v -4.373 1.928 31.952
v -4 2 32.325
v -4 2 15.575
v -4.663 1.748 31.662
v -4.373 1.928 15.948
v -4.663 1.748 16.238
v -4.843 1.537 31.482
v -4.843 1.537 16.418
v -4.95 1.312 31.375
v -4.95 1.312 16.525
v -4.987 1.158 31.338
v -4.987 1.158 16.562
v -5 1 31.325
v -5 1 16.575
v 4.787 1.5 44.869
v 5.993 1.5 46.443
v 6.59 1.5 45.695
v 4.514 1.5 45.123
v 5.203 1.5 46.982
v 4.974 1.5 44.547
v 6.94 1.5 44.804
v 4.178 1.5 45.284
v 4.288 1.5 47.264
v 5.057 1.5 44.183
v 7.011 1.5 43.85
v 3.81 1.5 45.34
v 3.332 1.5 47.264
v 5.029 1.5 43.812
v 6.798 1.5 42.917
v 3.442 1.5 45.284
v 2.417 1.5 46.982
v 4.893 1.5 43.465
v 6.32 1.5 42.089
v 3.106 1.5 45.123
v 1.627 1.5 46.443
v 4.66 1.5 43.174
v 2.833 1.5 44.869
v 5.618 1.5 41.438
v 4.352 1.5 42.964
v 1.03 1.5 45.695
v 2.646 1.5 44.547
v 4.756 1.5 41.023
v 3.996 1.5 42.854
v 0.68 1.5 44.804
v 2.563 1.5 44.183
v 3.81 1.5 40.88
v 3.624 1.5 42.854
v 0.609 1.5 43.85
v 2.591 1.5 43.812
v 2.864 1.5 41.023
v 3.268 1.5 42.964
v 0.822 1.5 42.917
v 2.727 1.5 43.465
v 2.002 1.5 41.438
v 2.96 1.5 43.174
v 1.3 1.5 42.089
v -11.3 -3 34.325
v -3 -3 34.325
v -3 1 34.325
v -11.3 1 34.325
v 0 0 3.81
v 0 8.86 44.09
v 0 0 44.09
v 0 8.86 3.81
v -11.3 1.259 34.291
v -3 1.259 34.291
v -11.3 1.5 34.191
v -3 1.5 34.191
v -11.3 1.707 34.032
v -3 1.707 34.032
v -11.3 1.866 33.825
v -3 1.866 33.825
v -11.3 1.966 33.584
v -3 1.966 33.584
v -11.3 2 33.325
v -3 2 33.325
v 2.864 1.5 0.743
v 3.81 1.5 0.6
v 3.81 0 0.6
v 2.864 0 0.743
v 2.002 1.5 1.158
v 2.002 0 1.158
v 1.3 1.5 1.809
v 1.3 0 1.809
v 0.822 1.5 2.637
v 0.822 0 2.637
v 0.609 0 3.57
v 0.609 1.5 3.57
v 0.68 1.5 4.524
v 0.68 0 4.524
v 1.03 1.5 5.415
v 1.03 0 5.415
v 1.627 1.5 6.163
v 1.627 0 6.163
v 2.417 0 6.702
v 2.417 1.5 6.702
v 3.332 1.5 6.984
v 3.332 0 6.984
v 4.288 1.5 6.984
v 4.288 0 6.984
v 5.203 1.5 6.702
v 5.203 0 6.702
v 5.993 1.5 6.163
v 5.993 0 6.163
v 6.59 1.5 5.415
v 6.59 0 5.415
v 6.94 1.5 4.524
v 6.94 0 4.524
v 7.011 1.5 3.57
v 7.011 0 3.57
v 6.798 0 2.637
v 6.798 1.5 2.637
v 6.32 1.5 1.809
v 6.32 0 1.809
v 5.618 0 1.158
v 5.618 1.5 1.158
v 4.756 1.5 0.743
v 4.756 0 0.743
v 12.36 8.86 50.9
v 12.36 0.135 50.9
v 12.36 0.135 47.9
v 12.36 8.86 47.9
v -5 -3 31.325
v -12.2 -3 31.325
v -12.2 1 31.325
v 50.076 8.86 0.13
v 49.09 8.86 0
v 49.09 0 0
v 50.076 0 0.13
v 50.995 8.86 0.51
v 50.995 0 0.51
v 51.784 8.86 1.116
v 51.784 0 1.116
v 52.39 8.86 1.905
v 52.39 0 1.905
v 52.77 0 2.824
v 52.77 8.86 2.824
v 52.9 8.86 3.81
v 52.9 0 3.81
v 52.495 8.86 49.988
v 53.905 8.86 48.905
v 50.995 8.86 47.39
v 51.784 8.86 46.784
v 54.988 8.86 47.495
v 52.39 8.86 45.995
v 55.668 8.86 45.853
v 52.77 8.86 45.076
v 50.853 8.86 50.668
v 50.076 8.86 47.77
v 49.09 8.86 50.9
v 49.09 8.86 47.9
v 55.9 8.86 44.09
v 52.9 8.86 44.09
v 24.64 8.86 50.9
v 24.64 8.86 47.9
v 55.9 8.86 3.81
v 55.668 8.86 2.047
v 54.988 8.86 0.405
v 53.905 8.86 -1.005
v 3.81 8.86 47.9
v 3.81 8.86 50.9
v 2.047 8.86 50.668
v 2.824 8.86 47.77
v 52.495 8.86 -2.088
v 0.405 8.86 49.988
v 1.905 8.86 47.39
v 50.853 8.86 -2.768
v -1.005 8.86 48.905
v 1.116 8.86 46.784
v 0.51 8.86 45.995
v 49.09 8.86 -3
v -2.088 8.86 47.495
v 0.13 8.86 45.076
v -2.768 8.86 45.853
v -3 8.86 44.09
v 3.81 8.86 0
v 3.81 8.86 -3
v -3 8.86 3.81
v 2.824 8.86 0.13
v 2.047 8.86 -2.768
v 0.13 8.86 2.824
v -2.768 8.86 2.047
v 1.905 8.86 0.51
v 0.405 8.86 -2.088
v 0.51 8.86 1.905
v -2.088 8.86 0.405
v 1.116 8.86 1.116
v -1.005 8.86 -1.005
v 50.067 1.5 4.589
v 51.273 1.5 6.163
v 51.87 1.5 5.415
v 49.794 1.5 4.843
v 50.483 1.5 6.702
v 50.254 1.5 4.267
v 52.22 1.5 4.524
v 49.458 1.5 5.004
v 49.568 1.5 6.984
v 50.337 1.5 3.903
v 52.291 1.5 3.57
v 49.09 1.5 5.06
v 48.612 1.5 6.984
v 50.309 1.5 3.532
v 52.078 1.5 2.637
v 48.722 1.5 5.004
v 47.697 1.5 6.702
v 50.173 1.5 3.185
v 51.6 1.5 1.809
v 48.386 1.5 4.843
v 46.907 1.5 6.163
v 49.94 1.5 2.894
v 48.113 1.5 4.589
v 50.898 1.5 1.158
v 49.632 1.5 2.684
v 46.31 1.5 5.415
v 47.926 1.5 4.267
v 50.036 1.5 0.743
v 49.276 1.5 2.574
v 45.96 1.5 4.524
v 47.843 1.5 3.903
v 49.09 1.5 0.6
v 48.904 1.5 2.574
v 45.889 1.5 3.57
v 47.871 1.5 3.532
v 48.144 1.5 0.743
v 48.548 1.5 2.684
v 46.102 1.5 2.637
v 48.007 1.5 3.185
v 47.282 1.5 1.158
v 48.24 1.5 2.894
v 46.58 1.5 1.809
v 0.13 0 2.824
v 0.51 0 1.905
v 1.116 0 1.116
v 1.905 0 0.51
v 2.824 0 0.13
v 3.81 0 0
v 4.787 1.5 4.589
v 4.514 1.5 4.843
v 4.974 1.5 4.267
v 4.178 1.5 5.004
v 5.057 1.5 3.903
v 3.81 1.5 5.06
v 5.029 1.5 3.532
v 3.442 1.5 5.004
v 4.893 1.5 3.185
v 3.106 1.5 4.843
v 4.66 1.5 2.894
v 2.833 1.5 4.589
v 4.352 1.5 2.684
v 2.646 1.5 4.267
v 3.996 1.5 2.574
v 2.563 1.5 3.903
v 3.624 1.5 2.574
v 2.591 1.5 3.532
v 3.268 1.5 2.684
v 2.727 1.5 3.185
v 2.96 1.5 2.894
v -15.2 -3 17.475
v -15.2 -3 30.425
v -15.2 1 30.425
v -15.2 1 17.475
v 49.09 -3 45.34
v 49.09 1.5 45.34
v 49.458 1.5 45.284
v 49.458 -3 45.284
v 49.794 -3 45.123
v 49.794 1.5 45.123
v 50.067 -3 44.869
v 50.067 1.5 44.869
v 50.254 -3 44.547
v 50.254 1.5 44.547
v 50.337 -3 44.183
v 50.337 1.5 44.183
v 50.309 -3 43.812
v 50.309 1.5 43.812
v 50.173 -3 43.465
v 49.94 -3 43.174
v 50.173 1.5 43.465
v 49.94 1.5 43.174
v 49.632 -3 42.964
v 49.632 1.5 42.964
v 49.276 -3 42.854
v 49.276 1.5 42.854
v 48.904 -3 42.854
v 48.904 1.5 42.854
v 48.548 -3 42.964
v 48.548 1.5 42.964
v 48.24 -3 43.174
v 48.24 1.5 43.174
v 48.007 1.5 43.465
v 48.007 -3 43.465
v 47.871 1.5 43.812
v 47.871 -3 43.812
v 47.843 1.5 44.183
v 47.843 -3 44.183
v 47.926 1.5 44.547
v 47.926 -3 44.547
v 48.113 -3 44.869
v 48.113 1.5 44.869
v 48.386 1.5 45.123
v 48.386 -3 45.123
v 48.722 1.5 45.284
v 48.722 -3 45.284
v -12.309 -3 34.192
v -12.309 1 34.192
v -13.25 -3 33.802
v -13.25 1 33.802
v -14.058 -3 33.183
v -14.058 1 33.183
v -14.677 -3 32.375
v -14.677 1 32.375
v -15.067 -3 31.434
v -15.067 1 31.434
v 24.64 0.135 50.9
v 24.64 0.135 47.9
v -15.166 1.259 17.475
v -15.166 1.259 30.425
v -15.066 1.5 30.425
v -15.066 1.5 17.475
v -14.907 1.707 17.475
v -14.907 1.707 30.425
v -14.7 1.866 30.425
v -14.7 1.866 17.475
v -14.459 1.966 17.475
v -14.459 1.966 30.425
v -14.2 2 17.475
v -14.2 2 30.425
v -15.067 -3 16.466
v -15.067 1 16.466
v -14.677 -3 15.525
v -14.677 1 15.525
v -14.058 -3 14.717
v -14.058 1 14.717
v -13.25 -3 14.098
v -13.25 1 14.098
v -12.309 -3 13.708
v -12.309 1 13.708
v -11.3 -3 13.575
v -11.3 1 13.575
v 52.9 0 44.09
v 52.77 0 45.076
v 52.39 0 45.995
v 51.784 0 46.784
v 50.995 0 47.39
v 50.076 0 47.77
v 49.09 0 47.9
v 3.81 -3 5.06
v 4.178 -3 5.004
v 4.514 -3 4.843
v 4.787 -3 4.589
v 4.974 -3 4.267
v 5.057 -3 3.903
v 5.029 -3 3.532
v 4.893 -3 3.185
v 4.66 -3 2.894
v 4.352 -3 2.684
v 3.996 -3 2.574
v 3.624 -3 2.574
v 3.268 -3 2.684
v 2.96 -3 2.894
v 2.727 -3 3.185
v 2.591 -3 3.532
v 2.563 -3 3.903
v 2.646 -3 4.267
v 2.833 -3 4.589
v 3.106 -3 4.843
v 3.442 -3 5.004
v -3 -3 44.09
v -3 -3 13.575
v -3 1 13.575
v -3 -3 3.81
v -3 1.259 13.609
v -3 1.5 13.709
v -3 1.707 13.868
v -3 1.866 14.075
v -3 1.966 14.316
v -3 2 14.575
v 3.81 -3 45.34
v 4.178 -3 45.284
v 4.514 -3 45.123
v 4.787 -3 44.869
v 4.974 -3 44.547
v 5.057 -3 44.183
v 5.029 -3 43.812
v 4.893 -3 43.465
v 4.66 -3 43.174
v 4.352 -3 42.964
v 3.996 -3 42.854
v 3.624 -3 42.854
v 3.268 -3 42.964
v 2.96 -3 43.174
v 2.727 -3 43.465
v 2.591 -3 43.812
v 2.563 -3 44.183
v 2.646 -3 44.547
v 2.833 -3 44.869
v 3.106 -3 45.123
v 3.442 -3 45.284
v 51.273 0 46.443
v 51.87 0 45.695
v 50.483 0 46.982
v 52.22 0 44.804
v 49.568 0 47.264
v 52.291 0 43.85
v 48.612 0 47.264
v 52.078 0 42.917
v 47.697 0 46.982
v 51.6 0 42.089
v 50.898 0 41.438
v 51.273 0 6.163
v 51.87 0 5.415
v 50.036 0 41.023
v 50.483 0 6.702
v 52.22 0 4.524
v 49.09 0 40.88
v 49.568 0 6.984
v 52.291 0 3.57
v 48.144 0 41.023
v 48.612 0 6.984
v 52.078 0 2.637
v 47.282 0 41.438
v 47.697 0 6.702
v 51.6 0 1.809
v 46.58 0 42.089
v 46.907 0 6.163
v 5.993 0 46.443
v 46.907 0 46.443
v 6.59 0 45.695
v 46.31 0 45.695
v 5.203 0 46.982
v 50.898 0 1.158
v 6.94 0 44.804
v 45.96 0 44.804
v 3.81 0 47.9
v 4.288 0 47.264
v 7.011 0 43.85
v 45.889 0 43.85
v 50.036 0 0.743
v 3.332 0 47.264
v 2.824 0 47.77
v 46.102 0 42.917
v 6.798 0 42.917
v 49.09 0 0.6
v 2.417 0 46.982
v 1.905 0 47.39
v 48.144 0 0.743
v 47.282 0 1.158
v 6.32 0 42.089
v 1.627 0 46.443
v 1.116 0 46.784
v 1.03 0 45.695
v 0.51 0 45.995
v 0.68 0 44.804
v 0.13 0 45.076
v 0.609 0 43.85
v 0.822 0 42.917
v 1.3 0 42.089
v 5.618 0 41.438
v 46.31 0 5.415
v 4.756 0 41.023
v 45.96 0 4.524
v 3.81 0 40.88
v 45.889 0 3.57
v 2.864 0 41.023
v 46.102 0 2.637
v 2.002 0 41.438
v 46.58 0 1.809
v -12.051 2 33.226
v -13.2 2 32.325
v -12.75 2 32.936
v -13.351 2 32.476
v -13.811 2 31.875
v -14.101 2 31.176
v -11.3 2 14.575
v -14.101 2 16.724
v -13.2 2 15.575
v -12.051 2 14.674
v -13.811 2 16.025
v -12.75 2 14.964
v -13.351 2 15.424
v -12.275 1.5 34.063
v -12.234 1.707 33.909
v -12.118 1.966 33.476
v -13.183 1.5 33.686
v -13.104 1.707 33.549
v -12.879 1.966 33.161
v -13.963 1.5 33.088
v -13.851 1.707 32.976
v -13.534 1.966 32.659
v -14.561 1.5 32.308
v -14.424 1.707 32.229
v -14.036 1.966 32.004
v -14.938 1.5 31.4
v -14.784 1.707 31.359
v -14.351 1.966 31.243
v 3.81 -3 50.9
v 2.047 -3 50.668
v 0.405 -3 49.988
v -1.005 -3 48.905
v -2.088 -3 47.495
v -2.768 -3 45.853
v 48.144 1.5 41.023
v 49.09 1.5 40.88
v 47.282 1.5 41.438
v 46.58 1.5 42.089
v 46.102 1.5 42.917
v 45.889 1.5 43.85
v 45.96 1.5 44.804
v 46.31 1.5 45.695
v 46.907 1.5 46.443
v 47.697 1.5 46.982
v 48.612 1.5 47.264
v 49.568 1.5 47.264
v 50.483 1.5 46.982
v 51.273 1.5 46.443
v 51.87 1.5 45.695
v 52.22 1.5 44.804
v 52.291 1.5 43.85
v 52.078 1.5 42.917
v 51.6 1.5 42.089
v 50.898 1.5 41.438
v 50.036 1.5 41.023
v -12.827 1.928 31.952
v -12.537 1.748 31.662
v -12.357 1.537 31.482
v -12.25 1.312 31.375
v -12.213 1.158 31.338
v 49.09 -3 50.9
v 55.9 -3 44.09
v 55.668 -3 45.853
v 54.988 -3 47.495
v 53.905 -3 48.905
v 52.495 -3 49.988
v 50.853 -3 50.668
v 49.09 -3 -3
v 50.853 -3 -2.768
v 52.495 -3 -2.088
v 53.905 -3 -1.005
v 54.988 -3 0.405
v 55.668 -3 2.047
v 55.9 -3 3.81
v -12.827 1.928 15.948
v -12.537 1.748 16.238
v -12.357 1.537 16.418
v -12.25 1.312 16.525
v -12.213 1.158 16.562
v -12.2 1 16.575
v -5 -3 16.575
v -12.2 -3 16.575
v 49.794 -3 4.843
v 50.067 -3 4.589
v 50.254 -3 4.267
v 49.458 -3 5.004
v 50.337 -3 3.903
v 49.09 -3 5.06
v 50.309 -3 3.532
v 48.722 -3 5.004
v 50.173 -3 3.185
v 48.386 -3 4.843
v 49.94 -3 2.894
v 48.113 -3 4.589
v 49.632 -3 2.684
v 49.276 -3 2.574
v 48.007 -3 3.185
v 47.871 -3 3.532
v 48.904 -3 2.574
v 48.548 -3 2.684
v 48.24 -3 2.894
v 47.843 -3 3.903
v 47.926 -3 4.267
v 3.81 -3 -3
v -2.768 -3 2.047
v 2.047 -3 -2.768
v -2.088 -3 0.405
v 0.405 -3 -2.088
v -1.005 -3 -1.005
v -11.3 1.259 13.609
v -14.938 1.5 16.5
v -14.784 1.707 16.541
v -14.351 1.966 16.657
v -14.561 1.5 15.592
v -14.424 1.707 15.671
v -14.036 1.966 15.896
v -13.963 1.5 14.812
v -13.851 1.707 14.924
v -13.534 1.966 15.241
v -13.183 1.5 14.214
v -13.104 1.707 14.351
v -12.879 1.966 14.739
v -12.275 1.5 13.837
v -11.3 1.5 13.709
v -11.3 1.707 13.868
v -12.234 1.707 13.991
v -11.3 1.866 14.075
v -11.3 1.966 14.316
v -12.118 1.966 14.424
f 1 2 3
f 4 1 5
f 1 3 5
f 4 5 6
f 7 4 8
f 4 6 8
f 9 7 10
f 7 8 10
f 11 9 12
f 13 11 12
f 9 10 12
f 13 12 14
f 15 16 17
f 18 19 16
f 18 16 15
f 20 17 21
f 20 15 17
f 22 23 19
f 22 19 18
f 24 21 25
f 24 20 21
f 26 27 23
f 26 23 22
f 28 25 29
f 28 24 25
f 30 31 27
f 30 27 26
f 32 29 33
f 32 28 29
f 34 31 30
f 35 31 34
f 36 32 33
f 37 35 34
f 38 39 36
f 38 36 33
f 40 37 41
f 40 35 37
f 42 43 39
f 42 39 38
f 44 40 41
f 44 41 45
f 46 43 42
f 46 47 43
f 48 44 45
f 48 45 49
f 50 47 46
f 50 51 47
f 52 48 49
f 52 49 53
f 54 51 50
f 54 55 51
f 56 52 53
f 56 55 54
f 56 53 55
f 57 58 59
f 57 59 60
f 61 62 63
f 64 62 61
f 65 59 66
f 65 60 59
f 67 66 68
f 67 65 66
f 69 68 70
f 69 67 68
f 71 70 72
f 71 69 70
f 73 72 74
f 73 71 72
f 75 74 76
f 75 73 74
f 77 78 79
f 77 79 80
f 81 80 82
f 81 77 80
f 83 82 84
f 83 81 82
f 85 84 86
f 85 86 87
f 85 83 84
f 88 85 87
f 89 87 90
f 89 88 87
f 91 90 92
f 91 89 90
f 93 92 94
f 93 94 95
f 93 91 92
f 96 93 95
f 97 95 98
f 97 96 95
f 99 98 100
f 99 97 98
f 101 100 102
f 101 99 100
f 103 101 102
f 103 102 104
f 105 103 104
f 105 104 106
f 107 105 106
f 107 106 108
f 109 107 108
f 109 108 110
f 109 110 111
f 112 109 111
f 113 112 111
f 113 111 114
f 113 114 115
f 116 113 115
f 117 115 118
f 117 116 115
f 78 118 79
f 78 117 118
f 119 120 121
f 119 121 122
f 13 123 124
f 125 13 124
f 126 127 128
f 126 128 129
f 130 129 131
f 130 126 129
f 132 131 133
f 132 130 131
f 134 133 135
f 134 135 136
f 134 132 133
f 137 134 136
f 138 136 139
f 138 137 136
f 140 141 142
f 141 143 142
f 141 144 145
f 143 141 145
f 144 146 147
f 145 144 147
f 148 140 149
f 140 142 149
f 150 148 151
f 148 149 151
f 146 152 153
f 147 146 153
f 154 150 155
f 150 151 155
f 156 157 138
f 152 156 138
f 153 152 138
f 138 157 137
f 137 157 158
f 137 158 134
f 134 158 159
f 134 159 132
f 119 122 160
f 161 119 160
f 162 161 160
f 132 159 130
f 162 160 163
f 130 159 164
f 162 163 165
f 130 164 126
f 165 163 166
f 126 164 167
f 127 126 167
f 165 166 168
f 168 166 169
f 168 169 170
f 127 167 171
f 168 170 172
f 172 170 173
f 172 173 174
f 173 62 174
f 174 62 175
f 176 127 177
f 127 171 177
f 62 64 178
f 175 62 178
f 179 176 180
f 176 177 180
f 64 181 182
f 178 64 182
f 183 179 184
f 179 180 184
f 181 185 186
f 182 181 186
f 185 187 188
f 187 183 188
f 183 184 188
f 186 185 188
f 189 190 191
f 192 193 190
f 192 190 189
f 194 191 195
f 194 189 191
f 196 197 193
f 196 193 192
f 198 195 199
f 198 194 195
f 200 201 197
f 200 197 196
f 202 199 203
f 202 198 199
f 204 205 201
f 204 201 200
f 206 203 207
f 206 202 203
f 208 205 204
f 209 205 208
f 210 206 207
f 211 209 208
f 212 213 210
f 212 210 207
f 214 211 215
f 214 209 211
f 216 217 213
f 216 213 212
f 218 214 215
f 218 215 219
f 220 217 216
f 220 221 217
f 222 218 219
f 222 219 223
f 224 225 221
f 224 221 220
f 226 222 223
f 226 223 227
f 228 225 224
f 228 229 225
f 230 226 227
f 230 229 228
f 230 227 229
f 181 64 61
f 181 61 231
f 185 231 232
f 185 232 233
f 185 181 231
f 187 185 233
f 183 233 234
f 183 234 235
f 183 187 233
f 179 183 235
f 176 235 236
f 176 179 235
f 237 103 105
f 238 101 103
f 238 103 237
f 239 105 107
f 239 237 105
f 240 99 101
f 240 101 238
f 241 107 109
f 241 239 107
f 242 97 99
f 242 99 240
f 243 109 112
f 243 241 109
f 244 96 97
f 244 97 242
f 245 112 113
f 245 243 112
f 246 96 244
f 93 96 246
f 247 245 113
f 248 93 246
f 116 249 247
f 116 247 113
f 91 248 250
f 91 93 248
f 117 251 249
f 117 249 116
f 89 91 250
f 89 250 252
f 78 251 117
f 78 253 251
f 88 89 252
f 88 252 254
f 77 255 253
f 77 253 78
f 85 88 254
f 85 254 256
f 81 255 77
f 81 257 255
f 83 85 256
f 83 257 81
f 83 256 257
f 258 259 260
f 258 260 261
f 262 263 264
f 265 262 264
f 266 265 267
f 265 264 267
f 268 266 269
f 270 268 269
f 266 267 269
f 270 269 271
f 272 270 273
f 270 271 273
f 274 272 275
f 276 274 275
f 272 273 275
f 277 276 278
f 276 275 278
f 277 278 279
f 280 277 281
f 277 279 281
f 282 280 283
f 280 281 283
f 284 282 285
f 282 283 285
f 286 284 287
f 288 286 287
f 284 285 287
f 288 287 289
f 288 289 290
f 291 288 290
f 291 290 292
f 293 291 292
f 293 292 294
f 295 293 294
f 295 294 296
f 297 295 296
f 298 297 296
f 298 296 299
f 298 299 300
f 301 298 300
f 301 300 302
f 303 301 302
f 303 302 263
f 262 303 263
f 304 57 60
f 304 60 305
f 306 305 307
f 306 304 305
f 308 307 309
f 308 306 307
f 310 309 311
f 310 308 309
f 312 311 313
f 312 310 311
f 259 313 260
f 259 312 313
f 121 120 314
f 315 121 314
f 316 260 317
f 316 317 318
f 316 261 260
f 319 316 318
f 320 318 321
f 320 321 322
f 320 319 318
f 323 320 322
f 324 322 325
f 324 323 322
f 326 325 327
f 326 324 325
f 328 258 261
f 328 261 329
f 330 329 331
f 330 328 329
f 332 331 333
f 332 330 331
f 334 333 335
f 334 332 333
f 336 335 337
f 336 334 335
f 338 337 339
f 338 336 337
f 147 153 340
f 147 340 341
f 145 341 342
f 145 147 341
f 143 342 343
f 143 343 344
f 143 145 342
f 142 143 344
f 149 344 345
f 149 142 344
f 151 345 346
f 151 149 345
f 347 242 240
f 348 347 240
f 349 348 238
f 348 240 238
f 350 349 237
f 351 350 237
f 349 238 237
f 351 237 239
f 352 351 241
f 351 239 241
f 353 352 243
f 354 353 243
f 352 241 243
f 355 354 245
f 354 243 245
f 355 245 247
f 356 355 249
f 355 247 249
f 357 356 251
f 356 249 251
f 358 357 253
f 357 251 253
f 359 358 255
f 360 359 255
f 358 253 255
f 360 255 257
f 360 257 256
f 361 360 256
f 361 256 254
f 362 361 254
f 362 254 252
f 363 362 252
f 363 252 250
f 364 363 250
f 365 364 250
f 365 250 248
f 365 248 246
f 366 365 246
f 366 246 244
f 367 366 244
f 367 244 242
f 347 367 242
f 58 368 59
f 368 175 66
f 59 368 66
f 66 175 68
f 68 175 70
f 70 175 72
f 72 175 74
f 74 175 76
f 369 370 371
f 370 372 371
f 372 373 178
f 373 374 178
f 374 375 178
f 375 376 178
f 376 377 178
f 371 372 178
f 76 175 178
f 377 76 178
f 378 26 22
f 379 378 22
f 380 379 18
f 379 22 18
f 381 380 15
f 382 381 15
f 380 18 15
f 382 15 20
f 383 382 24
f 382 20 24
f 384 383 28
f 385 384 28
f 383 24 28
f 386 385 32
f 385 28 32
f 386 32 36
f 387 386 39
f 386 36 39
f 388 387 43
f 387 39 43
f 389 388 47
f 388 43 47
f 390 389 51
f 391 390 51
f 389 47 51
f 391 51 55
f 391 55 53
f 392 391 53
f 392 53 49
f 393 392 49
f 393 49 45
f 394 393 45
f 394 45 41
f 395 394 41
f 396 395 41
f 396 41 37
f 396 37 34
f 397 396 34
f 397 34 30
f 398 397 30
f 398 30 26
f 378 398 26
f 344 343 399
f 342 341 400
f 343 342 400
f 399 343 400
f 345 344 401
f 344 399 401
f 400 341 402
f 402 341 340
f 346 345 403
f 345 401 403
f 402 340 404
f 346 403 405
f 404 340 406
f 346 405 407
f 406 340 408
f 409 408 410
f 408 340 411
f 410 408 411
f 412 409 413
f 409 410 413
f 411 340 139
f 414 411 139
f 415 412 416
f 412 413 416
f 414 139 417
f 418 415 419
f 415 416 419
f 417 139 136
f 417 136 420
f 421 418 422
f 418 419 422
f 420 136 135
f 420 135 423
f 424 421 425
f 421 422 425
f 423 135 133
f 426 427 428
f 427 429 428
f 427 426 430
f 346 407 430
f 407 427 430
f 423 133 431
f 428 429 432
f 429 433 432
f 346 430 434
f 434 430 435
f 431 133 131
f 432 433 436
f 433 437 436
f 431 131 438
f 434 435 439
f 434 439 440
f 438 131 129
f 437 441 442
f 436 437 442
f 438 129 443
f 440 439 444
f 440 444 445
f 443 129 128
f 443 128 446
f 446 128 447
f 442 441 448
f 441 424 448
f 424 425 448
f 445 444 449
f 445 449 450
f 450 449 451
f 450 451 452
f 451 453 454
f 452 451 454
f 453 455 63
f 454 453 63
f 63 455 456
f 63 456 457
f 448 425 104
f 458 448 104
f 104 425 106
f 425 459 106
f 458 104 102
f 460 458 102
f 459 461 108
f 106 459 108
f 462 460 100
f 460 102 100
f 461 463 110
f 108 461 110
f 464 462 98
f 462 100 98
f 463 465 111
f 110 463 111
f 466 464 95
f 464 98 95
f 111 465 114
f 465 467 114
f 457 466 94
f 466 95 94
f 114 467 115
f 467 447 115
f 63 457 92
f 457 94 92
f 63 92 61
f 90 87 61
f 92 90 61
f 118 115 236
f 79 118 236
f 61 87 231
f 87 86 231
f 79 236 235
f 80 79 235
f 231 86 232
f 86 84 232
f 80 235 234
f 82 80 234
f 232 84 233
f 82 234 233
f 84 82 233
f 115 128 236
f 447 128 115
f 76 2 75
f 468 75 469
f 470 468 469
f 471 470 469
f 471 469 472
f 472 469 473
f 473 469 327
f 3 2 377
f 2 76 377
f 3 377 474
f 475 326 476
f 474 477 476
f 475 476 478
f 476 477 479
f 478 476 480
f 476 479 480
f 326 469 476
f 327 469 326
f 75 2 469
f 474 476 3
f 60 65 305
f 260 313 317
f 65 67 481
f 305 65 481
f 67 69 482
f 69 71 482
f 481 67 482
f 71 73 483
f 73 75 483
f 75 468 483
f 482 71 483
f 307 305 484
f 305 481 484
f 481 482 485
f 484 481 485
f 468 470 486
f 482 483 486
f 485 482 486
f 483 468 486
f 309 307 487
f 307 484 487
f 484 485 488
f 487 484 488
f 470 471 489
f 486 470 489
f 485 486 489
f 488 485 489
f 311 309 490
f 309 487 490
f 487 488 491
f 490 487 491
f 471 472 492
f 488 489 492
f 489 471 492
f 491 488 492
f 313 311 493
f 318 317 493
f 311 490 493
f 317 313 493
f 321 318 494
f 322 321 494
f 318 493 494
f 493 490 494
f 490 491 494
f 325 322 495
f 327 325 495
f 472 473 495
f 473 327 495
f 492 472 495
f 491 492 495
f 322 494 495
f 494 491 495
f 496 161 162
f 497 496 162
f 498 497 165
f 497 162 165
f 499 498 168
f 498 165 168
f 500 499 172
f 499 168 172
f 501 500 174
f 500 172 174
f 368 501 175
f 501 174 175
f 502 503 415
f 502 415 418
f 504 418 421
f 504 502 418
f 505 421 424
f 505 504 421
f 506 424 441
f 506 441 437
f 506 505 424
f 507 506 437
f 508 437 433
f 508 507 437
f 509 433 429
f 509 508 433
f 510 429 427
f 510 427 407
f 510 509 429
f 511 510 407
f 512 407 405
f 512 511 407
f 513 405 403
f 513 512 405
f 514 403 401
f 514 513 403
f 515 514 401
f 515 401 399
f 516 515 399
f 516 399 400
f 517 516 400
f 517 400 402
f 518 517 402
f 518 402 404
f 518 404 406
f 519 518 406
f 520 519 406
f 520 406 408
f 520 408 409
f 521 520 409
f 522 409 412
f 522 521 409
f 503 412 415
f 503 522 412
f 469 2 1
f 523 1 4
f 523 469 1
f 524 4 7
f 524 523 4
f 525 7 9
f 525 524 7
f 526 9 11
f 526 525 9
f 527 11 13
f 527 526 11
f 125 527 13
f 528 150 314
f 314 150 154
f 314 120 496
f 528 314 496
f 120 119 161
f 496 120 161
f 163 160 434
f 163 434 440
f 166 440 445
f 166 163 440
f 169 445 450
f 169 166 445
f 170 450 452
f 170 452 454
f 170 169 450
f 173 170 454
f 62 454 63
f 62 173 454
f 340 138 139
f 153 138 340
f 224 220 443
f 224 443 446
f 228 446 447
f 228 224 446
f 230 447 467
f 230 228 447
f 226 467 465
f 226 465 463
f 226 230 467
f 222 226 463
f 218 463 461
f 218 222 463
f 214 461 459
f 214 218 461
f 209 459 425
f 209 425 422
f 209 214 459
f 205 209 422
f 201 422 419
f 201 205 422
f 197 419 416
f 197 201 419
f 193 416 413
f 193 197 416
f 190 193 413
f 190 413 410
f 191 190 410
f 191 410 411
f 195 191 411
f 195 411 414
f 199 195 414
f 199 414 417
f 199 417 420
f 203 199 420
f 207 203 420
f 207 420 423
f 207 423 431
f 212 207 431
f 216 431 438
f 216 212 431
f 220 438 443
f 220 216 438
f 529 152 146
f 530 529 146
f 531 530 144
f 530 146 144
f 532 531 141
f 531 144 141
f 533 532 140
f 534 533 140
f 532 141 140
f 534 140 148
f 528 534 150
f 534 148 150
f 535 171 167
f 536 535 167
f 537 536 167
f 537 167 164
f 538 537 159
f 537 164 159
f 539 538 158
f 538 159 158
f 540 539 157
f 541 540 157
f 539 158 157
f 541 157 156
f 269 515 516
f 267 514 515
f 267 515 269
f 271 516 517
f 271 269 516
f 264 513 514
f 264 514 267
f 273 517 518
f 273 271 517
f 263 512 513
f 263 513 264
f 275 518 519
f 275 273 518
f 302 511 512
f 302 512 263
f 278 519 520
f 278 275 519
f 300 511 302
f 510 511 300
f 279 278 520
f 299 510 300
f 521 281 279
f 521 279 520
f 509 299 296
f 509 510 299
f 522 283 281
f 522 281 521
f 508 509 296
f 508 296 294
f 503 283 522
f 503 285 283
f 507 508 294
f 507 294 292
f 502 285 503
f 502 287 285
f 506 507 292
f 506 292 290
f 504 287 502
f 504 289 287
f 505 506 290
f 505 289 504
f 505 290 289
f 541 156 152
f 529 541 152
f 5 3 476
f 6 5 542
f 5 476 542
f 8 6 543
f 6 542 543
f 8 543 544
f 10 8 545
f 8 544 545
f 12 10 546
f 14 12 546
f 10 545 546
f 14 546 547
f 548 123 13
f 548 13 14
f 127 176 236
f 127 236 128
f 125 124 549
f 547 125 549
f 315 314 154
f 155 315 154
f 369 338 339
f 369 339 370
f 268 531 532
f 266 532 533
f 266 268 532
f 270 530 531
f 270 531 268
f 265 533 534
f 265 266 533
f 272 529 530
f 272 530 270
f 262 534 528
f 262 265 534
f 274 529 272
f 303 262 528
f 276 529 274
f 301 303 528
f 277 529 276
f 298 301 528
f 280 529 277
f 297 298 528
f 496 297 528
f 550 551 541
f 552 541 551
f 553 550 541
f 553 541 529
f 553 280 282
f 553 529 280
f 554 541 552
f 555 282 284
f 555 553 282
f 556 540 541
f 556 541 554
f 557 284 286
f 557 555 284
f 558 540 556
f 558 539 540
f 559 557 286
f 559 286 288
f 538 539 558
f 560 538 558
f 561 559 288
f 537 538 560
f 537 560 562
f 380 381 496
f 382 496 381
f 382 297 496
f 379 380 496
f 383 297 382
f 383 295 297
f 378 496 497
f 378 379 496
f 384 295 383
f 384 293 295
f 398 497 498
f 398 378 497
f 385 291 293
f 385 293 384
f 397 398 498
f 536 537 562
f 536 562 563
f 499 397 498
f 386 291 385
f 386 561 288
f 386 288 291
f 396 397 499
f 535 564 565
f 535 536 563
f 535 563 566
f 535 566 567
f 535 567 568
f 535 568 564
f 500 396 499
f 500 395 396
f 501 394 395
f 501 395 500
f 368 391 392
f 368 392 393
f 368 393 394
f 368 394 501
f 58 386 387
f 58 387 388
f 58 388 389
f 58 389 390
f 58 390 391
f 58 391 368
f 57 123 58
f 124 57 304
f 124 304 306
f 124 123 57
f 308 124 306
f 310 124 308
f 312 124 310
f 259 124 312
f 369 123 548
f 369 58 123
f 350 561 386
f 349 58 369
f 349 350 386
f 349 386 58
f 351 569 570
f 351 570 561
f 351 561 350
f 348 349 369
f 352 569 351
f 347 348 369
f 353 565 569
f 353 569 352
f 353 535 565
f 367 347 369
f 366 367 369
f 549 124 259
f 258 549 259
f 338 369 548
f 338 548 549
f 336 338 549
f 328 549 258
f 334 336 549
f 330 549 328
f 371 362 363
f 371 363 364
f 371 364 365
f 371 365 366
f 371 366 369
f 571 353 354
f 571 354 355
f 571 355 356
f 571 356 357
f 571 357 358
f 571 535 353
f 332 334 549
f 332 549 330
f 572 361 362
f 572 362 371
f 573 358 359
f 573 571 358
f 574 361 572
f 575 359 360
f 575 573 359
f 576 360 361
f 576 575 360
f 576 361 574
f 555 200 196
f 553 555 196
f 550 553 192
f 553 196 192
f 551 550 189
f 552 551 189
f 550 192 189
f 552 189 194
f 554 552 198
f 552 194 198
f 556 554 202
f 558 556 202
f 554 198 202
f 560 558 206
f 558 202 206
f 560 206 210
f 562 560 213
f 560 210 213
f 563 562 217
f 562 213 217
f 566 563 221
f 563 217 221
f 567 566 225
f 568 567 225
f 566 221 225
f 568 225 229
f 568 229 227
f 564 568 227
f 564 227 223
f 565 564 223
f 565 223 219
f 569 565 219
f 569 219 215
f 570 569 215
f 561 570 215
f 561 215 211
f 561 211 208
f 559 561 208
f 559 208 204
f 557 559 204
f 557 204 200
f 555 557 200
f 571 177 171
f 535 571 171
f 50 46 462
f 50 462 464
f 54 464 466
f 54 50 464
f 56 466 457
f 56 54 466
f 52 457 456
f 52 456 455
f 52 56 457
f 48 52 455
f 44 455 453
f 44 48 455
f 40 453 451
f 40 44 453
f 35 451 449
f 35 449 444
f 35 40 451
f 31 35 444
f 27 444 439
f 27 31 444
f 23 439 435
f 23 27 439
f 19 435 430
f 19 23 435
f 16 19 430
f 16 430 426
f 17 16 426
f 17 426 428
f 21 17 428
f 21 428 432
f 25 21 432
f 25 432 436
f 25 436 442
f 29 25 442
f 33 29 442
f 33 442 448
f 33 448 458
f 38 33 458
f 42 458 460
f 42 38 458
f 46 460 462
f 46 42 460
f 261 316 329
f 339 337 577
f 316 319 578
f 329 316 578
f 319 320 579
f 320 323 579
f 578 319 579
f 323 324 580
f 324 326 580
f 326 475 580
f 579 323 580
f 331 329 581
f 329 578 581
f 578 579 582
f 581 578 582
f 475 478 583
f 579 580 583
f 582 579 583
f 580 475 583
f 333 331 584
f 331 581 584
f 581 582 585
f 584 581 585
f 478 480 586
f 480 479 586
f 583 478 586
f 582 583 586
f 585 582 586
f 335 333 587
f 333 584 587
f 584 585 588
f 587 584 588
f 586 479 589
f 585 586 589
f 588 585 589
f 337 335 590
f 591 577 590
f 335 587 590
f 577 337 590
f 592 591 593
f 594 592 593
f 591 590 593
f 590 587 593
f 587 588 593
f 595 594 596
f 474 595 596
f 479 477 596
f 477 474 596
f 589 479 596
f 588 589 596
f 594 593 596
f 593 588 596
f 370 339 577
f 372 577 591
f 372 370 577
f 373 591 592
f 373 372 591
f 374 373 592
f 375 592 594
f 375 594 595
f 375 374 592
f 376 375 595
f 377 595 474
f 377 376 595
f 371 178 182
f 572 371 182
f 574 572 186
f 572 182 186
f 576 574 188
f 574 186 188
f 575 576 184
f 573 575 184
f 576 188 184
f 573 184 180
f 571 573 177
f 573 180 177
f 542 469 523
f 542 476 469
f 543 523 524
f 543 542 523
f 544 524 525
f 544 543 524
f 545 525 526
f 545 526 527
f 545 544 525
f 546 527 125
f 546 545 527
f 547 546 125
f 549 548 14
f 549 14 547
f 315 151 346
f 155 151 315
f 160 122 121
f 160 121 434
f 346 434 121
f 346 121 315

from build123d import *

# Parameters (mm, degrees)
BOSS_EXTRUDE1_DEPTH = 3
CUT_EXTRUDE1_REACH  = 77.661
SKETCH1_3_R         = 1.25
BOSS_EXTRUDE2_START = 8.86
BOSS_EXTRUDE2_DEPTH = 8.86
BOSS_EXTRUDE3_START = 1.5
SKETCH1_5_R         = 3.21
SKETCH1_5_R_2       = 1.25
BOSS_EXTRUDE3_DEPTH = 1.5
SKETCH2_W           = 12.28
SKETCH2_H           = 8.73
CUT_EXTRUDE2_DEPTH  = 3
SKETCH7_W           = 7.2
SKETCH7_H           = 14.75
BOSS_EXTRUDE6_DEPTH = 5
FILLET3_R           = 1


with BuildPart() as part:
    # Sketch1 → Boss-Extrude1 (new body)
    with BuildSketch(Plane(origin=(0, 0, 0), x_dir=(1, 0, 0), z_dir=(0, 1, 0))):
        with BuildLine():
            Line((3.81, 3), (49.09, 3))
            ThreePointArc((49.09, 3), (53.90539718, 1.00539718), (55.9, -3.81))
            Line((55.9, -3.81), (55.9, -44.09))
            ThreePointArc((55.9, -44.09), (53.90539718, -48.90539718), (49.09, -50.9))
            Line((49.09, -50.9), (3.81, -50.9))
            ThreePointArc((3.81, -50.9), (-1.00539718, -48.90539718), (-3, -44.09))
            Line((-3, -44.09), (-3, -3.81))
            ThreePointArc((-3, -3.81), (-1.00539718, 1.00539718), (3.81, 3))
        make_face()
    extrude(amount=-BOSS_EXTRUDE1_DEPTH)

    # Sketch1<3> → Cut-Extrude1 (cut, up to next)
    with BuildSketch(Plane(origin=(0, 0, 0), x_dir=(1, 0, 0), z_dir=(0, 1, 0)), mode=Mode.PRIVATE) as cut_extrude1_sk1:
        with Locations((49.09, -44.09)):
            Circle(SKETCH1_3_R)
    cut_extrude1_tool1 = extrude(cut_extrude1_sk1.sketch, amount=-CUT_EXTRUDE1_REACH, mode=Mode.PRIVATE) & part.part
    # Sketch1<3> → Cut-Extrude1 (cut, up to next)
    with BuildSketch(Plane(origin=(0, 0, 0), x_dir=(1, 0, 0), z_dir=(0, 1, 0)), mode=Mode.PRIVATE) as cut_extrude1_sk2:
        with Locations((3.81, -44.09)):
            Circle(SKETCH1_3_R)
    cut_extrude1_tool2 = extrude(cut_extrude1_sk2.sketch, amount=-CUT_EXTRUDE1_REACH, mode=Mode.PRIVATE) & part.part
    # Sketch1<3> → Cut-Extrude1 (cut, up to next)
    with BuildSketch(Plane(origin=(0, 0, 0), x_dir=(1, 0, 0), z_dir=(0, 1, 0)), mode=Mode.PRIVATE) as cut_extrude1_sk3:
        with Locations((3.81, -3.81)):
            Circle(SKETCH1_3_R)
    cut_extrude1_tool3 = extrude(cut_extrude1_sk3.sketch, amount=-CUT_EXTRUDE1_REACH, mode=Mode.PRIVATE) & part.part
    # Sketch1<3> → Cut-Extrude1 (cut, up to next)
    with BuildSketch(Plane(origin=(0, 0, 0), x_dir=(1, 0, 0), z_dir=(0, 1, 0)), mode=Mode.PRIVATE) as cut_extrude1_sk4:
        with Locations((49.09, -3.81)):
            Circle(SKETCH1_3_R)
    cut_extrude1_tool4 = extrude(cut_extrude1_sk4.sketch, amount=-CUT_EXTRUDE1_REACH, mode=Mode.PRIVATE) & part.part
    add(cut_extrude1_tool1.solids().sort_by_distance((49.09, 0, 44.09))[0], mode=Mode.SUBTRACT)
    add(cut_extrude1_tool2.solids().sort_by_distance((3.81, 0, 44.09))[0], mode=Mode.SUBTRACT)
    add(cut_extrude1_tool3.solids().sort_by_distance((3.81, 0, 3.81))[0], mode=Mode.SUBTRACT)
    add(cut_extrude1_tool4.solids().sort_by_distance((49.09, 0, 3.81))[0], mode=Mode.SUBTRACT)

    # Sketch1<4> → Boss-Extrude2 (add)
    with BuildSketch(Plane(origin=(0, 0, 0), x_dir=(1, 0, 0), z_dir=(0, 1, 0)).offset(BOSS_EXTRUDE2_START)):
        with BuildLine():
            Line((49.09, 3), (3.81, 3))
            ThreePointArc((3.81, 3), (-1.00539718, 1.00539718), (-3, -3.81))
            Line((-3, -3.81), (-3, -44.09))
            ThreePointArc((-3, -44.09), (-1.00539718, -48.90539718), (3.81, -50.9))
            Line((3.81, -50.9), (49.09, -50.9))
            ThreePointArc((49.09, -50.9), (53.90539718, -48.90539718), (55.9, -44.09))
            Line((55.9, -44.09), (55.9, -3.81))
            ThreePointArc((55.9, -3.81), (53.90539718, 1.00539718), (49.09, 3))
        make_face()
        with BuildLine():
            ThreePointArc((0, -3.81), (1.115923164, -1.115923164), (3.81, 0))
            Line((3.81, 0), (49.09, 0))
            ThreePointArc((49.09, 0), (51.784076836, -1.115923164), (52.9, -3.81))
            Line((52.9, -3.81), (52.9, -44.09))
            ThreePointArc((52.9, -44.09), (51.784076836, -46.784076836), (49.09, -47.9))
            Line((49.09, -47.9), (3.81, -47.9))
            ThreePointArc((3.81, -47.9), (1.115923164, -46.784076836), (0, -44.09))
            Line((0, -44.09), (0, -3.81))
        make_face(mode=Mode.SUBTRACT)
    extrude(amount=-BOSS_EXTRUDE2_DEPTH)

    # Sketch1<5> → Boss-Extrude3 (add)
    # profile 1 of 4: a face of its own
    with BuildSketch(Plane(origin=(0, 0, 0), x_dir=(1, 0, 0), z_dir=(0, 1, 0)).offset(BOSS_EXTRUDE3_START)):
        with Locations((3.81, -3.81)):
            Circle(SKETCH1_5_R)
        with Locations((3.81, -3.81)):
            Circle(SKETCH1_5_R_2, mode=Mode.SUBTRACT)
    # profile 2 of 4: a face of its own
    with BuildSketch(Plane(origin=(0, 0, 0), x_dir=(1, 0, 0), z_dir=(0, 1, 0)).offset(BOSS_EXTRUDE3_START)):
        with Locations((49.09, -3.81)):
            Circle(SKETCH1_5_R)
        with Locations((49.09, -3.81)):
            Circle(SKETCH1_5_R_2, mode=Mode.SUBTRACT)
    # profile 3 of 4: a face of its own
    with BuildSketch(Plane(origin=(0, 0, 0), x_dir=(1, 0, 0), z_dir=(0, 1, 0)).offset(BOSS_EXTRUDE3_START)):
        with Locations((49.09, -44.09)):
            Circle(SKETCH1_5_R)
        with Locations((49.09, -44.09)):
            Circle(SKETCH1_5_R_2, mode=Mode.SUBTRACT)
    # profile 4 of 4: a face of its own
    with BuildSketch(Plane(origin=(0, 0, 0), x_dir=(1, 0, 0), z_dir=(0, 1, 0)).offset(BOSS_EXTRUDE3_START)):
        with Locations((3.81, -44.09)):
            Circle(SKETCH1_5_R)
        with Locations((3.81, -44.09)):
            Circle(SKETCH1_5_R_2, mode=Mode.SUBTRACT)
    extrude(amount=-BOSS_EXTRUDE3_DEPTH)

    # Sketch2 → Cut-Extrude2 (cut)
    with BuildSketch(Plane.XY.offset(50.9)):
        with Locations((18.5, 4.5)):
            Rectangle(SKETCH2_W, SKETCH2_H)
    extrude(amount=-CUT_EXTRUDE2_DEPTH, mode=Mode.SUBTRACT)

    # Sketch7 → Boss-Extrude6 (add)
    with BuildSketch(Plane(origin=(0, -3, 0), x_dir=(-1, 0, 0), z_dir=(0, -1, 0))):
        with BuildLine():
            Line((3, -34.325), (11.3, -34.325))
            ThreePointArc((11.3, -34.325), (14.057716447, -33.182716447), (15.2, -30.425))
            Line((15.2, -30.425), (15.2, -17.475))
            ThreePointArc((15.2, -17.475), (14.057716447, -14.717283553), (11.3, -13.575))
            Line((11.3, -13.575), (3, -13.575))
            Line((3, -13.575), (3, -34.325))
        make_face()
        with Locations((8.6, -23.95)):
            Rectangle(SKETCH7_W, SKETCH7_H, mode=Mode.SUBTRACT)
    extrude(amount=-BOSS_EXTRUDE6_DEPTH)

    # Fillet3
    fillet3_edges = [part.edges().sort_by_distance(p)[0] for p in [
        (-7.15, 2, 34.325),
        (-14.057716447, 2, 33.182716447),
        (-15.2, 2, 23.95),
        (-14.057716447, 2, 14.717283553),
        (-7.15, 2, 13.575),
        (-8.6, 2, 16.575),
        (-5, 2, 23.95),
        (-12.2, 2, 23.95),
        (-8.6, 2, 31.325),
    ]]
    fillet(fillet3_edges, radius=FILLET3_R)


solid = part.part
